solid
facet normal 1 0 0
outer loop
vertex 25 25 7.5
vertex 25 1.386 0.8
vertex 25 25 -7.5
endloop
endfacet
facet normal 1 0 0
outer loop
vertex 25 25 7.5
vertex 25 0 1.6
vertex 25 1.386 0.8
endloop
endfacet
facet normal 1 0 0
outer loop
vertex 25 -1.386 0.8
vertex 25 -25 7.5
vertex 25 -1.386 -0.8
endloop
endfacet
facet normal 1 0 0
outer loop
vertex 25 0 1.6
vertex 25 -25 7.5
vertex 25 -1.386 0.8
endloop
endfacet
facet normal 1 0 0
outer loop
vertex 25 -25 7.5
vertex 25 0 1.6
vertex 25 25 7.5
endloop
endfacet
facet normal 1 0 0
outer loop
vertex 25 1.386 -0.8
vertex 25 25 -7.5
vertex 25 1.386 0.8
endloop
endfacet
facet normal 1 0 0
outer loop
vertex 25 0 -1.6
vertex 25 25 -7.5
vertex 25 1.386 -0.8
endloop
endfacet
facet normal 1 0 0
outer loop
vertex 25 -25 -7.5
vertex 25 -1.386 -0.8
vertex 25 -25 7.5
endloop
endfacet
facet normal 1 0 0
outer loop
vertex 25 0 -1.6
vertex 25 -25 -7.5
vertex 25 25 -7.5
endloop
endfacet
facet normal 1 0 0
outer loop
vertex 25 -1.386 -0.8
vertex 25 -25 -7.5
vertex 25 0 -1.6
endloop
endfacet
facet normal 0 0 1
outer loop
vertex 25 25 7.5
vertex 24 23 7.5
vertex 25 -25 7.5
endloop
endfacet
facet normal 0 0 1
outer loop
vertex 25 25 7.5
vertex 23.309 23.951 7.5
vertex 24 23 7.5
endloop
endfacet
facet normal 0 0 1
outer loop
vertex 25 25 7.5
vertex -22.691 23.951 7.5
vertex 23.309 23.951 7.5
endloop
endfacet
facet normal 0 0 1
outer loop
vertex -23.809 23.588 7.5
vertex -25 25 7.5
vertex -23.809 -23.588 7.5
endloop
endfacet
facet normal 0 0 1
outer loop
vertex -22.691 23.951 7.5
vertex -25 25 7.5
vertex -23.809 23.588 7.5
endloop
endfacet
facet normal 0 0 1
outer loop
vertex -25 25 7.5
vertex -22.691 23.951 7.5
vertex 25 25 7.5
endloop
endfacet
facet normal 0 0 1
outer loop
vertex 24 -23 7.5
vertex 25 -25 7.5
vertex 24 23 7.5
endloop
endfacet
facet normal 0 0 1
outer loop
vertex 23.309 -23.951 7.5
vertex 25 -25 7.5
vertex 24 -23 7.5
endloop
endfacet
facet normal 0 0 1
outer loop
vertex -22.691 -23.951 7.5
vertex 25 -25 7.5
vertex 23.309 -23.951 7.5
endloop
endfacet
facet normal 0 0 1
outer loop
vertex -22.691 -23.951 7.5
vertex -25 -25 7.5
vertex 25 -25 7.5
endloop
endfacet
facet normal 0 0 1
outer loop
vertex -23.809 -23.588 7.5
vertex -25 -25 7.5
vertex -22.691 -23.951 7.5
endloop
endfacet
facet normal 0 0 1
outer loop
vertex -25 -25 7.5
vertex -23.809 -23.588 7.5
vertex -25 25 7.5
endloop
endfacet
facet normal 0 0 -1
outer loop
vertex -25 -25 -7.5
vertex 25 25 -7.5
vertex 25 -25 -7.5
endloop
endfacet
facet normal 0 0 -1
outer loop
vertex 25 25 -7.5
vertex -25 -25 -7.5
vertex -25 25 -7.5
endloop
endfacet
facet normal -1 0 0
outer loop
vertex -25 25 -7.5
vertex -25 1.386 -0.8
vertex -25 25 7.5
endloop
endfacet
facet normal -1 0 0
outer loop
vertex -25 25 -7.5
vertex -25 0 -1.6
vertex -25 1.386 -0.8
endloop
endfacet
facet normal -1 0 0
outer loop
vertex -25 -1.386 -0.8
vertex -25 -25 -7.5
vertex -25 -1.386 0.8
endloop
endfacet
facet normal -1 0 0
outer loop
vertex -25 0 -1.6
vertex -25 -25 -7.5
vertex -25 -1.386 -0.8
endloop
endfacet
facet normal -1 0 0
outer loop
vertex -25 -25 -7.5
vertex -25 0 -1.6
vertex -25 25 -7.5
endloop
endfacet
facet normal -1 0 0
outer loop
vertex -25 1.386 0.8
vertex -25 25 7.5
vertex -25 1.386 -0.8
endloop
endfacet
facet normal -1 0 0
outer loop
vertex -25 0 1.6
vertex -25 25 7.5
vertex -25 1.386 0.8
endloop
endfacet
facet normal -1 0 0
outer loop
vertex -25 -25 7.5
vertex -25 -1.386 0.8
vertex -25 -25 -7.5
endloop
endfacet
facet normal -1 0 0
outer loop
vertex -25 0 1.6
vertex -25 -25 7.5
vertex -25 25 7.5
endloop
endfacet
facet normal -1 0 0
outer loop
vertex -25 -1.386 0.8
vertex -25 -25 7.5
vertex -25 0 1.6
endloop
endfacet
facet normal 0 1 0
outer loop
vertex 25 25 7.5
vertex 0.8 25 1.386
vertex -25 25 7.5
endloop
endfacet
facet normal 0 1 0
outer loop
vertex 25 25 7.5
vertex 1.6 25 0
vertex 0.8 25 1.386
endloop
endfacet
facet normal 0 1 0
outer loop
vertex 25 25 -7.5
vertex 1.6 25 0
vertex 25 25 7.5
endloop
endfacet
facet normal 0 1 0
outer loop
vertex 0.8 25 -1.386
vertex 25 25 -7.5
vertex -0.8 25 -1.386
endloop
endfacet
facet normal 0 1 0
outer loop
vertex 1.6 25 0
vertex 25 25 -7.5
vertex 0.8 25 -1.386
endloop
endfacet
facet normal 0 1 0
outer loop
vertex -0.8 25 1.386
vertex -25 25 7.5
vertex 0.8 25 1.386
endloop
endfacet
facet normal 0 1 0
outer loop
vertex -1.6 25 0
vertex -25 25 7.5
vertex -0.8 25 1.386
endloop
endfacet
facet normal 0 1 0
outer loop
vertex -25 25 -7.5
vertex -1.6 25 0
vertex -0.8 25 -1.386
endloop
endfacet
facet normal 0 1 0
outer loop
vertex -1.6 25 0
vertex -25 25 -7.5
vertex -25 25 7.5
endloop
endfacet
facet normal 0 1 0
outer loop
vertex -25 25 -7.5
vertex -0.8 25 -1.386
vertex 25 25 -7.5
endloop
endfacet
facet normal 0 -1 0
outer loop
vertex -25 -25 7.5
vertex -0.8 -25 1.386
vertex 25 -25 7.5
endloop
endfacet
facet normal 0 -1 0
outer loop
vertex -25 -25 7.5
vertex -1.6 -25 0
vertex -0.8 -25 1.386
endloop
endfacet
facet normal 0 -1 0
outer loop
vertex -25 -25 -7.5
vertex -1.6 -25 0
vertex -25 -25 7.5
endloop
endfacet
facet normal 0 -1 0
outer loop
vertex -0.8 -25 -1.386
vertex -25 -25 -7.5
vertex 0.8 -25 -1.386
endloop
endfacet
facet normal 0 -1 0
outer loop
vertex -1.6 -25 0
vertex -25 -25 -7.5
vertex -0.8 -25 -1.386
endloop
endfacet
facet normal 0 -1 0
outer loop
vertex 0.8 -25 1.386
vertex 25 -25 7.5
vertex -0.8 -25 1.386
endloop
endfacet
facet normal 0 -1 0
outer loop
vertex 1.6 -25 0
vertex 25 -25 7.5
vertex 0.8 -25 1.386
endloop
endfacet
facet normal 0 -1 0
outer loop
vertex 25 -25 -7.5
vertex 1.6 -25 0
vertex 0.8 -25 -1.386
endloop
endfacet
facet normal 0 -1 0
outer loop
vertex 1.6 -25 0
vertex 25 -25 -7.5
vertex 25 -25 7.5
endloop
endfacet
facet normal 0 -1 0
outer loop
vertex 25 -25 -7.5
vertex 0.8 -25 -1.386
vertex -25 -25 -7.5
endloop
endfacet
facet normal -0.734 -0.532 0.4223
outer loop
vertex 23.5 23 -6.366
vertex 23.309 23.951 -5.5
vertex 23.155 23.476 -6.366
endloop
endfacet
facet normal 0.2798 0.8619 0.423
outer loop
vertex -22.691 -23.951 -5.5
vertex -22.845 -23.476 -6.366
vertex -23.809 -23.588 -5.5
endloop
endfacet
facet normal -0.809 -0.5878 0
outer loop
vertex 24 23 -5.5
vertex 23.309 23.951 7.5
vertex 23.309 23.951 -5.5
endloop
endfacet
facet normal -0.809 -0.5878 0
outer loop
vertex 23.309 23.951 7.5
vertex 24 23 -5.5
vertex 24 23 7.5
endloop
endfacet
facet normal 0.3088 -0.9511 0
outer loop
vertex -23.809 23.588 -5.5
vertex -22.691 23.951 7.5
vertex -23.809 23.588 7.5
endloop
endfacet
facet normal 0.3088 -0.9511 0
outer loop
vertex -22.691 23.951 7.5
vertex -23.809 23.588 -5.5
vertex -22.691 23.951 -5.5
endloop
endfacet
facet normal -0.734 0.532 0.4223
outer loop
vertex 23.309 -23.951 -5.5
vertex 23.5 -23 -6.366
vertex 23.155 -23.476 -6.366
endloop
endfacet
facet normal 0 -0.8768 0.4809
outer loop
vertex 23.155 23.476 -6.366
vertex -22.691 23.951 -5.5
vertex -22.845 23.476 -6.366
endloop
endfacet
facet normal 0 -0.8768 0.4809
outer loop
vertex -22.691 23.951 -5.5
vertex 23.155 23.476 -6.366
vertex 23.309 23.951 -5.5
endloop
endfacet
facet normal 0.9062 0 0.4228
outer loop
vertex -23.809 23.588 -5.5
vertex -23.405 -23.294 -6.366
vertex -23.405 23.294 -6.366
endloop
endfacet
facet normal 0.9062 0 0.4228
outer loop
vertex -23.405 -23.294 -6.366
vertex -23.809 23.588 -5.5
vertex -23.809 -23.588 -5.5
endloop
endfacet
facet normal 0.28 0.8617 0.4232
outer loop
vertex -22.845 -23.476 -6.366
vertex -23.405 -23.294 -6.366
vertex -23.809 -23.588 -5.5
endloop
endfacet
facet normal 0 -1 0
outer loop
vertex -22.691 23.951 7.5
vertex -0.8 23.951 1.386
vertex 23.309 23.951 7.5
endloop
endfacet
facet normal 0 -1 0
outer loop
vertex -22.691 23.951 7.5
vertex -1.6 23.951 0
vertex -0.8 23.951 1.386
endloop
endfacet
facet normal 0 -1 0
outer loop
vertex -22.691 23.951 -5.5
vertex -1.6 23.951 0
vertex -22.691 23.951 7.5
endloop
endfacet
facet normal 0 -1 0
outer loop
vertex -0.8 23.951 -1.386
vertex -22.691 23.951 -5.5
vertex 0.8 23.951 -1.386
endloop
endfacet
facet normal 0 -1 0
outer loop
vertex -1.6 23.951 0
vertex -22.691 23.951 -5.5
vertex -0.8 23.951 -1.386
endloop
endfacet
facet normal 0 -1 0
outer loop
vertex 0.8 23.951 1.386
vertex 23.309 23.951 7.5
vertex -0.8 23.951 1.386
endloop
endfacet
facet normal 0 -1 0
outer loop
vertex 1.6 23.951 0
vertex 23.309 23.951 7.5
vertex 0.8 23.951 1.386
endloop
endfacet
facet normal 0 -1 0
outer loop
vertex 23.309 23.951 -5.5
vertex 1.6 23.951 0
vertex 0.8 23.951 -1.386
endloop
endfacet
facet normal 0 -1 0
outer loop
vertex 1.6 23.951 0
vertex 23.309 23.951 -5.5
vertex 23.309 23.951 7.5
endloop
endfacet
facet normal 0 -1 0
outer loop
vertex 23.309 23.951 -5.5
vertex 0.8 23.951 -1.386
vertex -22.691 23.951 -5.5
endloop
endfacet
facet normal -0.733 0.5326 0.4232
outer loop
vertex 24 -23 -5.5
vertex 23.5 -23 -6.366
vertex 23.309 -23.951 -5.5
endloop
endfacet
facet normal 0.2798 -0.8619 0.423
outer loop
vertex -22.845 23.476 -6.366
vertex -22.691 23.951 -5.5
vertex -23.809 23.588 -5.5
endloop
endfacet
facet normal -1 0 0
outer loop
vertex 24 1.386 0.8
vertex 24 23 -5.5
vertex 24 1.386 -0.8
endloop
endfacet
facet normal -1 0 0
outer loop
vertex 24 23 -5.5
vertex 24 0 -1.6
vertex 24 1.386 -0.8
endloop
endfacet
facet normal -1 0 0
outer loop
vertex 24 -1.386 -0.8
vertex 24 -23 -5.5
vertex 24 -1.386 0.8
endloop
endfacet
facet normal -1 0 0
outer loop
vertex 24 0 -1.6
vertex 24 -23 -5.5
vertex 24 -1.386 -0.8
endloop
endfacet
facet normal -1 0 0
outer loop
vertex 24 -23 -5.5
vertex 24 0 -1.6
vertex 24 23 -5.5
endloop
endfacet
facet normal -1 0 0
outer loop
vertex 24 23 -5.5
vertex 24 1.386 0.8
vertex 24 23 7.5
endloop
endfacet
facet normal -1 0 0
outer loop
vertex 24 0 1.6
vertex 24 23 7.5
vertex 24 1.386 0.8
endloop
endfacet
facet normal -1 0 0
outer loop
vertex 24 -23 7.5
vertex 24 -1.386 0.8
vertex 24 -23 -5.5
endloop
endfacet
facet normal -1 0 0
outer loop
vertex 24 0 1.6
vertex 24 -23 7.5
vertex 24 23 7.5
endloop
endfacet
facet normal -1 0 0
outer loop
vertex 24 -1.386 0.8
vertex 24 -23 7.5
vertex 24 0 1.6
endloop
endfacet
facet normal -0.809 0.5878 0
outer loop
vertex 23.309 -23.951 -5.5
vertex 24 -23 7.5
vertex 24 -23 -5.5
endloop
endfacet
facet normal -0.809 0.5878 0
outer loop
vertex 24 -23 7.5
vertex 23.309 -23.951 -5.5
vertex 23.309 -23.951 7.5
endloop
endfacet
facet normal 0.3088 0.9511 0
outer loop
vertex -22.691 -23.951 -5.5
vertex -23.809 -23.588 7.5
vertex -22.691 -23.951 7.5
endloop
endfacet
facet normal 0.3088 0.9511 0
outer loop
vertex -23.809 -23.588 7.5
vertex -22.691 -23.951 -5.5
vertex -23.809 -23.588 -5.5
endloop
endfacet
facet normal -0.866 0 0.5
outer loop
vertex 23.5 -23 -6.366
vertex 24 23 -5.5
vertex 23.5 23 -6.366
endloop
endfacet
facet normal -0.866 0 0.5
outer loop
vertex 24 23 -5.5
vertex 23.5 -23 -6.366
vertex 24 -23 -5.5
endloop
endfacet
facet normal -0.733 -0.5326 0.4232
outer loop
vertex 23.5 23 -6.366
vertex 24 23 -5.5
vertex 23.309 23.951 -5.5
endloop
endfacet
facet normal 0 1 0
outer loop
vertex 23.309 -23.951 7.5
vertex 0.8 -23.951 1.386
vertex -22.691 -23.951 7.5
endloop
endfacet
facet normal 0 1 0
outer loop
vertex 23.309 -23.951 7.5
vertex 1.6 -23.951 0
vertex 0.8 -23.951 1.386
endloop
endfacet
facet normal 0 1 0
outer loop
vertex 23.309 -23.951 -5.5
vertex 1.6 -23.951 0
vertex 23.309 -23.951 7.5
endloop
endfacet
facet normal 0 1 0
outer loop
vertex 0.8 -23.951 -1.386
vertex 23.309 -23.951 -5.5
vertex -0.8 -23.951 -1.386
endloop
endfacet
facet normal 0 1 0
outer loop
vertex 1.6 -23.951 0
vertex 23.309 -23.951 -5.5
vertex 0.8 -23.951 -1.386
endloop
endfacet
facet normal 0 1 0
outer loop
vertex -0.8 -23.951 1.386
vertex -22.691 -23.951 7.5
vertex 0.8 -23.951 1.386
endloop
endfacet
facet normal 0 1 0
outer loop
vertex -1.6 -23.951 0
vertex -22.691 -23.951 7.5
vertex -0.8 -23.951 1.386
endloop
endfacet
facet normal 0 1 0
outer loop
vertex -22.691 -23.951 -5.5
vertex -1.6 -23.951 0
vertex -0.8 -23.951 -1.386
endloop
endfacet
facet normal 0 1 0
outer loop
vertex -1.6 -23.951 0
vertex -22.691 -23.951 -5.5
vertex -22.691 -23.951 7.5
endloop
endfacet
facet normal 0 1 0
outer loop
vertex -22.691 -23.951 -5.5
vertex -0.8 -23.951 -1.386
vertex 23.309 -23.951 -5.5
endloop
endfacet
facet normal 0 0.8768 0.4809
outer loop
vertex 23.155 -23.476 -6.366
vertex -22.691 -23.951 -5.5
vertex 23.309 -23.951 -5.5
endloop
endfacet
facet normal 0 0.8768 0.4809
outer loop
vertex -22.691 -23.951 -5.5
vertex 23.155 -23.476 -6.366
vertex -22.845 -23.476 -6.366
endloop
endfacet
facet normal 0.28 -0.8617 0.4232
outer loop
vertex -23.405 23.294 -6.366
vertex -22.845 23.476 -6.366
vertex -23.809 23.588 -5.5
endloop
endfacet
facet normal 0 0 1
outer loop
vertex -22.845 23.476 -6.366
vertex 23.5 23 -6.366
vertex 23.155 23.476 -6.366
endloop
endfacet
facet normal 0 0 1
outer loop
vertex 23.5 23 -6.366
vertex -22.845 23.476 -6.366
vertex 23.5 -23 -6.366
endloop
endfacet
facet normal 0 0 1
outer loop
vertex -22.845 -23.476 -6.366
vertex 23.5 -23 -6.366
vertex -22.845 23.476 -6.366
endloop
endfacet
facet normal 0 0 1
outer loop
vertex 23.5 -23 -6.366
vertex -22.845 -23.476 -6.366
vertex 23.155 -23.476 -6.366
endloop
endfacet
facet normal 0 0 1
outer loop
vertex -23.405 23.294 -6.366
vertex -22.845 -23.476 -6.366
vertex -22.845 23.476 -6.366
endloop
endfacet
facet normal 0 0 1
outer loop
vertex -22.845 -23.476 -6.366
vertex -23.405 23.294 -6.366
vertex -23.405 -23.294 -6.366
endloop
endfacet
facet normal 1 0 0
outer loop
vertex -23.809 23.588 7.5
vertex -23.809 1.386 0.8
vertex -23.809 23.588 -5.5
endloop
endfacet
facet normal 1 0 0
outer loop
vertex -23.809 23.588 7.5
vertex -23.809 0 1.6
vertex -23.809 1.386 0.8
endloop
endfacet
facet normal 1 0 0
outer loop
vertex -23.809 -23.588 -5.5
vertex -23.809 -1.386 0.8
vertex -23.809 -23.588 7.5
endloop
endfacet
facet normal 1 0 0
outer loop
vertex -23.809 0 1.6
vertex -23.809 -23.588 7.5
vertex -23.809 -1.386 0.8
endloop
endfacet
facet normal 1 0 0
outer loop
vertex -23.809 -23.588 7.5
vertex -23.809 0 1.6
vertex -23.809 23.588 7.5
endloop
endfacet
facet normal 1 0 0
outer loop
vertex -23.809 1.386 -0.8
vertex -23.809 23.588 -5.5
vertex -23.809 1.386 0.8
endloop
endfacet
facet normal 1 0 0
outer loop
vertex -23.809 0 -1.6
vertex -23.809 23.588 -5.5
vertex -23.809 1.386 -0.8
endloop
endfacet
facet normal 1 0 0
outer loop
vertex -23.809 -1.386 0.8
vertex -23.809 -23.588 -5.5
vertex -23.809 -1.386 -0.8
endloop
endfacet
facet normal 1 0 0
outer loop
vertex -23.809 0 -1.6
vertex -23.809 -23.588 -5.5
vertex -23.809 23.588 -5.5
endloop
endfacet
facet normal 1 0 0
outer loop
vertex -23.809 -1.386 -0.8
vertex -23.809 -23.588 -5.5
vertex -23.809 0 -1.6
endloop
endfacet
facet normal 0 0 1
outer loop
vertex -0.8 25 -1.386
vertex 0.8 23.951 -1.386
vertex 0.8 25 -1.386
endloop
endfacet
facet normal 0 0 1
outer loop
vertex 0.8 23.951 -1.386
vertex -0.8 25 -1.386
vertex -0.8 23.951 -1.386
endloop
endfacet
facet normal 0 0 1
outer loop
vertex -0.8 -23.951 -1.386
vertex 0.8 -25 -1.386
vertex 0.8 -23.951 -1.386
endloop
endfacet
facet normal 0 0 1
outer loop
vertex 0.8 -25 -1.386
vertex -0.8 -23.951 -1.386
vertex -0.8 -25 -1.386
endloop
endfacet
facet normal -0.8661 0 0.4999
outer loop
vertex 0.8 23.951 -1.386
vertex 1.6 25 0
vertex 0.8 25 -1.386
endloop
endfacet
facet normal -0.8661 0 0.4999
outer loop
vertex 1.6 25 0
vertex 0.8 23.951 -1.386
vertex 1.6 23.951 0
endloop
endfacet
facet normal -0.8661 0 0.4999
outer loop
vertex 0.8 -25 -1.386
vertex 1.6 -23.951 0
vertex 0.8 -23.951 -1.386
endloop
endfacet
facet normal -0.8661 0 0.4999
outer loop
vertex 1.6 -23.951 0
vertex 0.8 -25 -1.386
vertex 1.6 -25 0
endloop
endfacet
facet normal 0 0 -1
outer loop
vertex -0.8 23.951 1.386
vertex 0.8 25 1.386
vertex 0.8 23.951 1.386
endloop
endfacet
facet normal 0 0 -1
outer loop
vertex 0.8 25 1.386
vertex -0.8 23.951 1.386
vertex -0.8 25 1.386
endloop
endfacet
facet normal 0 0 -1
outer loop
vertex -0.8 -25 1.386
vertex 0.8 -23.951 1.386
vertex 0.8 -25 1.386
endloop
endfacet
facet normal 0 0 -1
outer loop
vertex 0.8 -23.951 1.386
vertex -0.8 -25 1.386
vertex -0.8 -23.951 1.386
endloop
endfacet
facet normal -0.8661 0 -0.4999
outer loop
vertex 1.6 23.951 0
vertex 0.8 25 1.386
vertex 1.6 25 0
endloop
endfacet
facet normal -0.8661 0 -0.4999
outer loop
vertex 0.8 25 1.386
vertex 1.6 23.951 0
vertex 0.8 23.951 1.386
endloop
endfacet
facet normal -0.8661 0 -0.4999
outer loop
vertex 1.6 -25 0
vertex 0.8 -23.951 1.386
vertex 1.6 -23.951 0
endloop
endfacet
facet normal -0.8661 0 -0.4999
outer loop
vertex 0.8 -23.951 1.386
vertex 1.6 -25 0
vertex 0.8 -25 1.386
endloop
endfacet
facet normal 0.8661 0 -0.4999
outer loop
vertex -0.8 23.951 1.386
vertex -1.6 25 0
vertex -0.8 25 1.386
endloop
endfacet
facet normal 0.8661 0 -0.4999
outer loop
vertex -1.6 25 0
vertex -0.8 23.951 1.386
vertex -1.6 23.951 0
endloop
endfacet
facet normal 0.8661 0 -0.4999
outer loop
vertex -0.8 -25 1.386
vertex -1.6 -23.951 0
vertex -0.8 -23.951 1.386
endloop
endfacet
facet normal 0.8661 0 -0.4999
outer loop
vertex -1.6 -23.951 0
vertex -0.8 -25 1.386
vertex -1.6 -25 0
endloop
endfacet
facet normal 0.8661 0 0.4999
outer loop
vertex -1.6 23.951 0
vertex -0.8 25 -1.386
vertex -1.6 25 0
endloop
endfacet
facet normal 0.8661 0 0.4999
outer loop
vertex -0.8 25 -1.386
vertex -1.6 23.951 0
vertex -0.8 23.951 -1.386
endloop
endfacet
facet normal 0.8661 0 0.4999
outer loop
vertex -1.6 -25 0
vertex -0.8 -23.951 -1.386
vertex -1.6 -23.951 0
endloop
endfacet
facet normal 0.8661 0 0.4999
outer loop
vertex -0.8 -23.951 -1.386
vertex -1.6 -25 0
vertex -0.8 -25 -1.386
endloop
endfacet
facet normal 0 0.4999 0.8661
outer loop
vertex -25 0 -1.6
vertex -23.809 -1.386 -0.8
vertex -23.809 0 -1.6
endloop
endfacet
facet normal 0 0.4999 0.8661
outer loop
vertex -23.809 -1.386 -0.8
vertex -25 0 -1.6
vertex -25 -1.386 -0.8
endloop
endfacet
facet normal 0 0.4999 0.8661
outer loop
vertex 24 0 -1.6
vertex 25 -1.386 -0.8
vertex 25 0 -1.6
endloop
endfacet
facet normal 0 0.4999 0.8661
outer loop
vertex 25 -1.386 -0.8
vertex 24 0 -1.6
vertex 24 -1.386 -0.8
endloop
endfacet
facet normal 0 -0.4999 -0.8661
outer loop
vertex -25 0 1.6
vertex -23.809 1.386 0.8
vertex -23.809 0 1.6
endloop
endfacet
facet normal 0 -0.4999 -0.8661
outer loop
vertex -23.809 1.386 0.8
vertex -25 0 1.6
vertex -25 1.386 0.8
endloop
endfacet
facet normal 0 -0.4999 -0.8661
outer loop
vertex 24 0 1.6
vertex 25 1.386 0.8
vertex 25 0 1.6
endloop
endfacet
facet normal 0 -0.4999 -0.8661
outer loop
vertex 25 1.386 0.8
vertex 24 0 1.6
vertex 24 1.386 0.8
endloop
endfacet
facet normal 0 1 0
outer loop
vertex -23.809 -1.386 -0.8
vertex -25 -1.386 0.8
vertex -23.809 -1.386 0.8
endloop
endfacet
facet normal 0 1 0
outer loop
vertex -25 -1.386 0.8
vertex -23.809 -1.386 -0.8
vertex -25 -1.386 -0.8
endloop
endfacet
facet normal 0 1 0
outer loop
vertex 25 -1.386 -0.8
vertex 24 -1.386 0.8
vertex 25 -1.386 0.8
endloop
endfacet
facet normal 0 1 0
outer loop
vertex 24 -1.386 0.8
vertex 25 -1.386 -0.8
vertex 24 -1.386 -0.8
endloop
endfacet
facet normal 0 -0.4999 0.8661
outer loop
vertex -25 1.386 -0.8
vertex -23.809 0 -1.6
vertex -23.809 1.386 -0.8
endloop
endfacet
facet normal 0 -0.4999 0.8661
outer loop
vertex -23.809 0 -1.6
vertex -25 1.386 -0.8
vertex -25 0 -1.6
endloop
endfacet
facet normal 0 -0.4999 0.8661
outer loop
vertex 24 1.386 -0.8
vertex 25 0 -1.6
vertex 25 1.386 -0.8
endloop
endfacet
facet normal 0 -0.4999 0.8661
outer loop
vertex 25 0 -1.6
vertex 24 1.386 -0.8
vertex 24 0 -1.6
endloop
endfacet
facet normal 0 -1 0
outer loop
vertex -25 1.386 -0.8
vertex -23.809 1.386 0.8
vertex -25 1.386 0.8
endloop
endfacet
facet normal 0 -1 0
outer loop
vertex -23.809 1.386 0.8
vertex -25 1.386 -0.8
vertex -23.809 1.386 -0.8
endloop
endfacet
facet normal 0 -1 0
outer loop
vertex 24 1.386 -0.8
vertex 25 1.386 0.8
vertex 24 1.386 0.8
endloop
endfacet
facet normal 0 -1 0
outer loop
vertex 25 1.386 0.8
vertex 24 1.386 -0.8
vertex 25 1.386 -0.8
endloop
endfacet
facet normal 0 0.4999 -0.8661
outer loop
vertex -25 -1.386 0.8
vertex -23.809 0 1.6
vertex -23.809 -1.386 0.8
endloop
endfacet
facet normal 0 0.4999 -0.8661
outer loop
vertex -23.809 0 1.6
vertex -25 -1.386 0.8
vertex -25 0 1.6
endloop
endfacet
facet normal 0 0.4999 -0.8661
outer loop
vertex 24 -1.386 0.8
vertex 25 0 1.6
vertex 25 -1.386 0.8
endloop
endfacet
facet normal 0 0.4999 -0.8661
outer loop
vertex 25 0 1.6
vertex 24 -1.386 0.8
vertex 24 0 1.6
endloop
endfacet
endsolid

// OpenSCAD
// -------------------------------------------
//
//   1515 Panel Maker by Adam Bryant
//
// -------------------------------------------

// Place holder for Size variables.
// M5Stack Extrusion is pre cut to 50, 100, 200, 500mm long.

Length=50; // X Dimension
Width=50; // Y Dimension
Height=15; //1515 Extrusion width
Screw_hole=3.2; // M3 Screw
Wall=4; // Wall thickness.


difference() {
cube([Length,Width,Height],center=true); //Initial Panel size.
translate([0,0,2]) // Moves Cavity Piece to correct height.

minkowski(){
cube([Length-Wall,Width-Wall,Height],center=true); // Cavity size.
sphere(1); // If this is increased, Wall thickness must be increased.
}

rotate([90,0,0])
cylinder(Length+2,Screw_hole/2,Screw_hole/2, center=true);
rotate([0,90,0])
cylinder(Width+2,Screw_hole/2,Screw_hole/2, center=true);
}
